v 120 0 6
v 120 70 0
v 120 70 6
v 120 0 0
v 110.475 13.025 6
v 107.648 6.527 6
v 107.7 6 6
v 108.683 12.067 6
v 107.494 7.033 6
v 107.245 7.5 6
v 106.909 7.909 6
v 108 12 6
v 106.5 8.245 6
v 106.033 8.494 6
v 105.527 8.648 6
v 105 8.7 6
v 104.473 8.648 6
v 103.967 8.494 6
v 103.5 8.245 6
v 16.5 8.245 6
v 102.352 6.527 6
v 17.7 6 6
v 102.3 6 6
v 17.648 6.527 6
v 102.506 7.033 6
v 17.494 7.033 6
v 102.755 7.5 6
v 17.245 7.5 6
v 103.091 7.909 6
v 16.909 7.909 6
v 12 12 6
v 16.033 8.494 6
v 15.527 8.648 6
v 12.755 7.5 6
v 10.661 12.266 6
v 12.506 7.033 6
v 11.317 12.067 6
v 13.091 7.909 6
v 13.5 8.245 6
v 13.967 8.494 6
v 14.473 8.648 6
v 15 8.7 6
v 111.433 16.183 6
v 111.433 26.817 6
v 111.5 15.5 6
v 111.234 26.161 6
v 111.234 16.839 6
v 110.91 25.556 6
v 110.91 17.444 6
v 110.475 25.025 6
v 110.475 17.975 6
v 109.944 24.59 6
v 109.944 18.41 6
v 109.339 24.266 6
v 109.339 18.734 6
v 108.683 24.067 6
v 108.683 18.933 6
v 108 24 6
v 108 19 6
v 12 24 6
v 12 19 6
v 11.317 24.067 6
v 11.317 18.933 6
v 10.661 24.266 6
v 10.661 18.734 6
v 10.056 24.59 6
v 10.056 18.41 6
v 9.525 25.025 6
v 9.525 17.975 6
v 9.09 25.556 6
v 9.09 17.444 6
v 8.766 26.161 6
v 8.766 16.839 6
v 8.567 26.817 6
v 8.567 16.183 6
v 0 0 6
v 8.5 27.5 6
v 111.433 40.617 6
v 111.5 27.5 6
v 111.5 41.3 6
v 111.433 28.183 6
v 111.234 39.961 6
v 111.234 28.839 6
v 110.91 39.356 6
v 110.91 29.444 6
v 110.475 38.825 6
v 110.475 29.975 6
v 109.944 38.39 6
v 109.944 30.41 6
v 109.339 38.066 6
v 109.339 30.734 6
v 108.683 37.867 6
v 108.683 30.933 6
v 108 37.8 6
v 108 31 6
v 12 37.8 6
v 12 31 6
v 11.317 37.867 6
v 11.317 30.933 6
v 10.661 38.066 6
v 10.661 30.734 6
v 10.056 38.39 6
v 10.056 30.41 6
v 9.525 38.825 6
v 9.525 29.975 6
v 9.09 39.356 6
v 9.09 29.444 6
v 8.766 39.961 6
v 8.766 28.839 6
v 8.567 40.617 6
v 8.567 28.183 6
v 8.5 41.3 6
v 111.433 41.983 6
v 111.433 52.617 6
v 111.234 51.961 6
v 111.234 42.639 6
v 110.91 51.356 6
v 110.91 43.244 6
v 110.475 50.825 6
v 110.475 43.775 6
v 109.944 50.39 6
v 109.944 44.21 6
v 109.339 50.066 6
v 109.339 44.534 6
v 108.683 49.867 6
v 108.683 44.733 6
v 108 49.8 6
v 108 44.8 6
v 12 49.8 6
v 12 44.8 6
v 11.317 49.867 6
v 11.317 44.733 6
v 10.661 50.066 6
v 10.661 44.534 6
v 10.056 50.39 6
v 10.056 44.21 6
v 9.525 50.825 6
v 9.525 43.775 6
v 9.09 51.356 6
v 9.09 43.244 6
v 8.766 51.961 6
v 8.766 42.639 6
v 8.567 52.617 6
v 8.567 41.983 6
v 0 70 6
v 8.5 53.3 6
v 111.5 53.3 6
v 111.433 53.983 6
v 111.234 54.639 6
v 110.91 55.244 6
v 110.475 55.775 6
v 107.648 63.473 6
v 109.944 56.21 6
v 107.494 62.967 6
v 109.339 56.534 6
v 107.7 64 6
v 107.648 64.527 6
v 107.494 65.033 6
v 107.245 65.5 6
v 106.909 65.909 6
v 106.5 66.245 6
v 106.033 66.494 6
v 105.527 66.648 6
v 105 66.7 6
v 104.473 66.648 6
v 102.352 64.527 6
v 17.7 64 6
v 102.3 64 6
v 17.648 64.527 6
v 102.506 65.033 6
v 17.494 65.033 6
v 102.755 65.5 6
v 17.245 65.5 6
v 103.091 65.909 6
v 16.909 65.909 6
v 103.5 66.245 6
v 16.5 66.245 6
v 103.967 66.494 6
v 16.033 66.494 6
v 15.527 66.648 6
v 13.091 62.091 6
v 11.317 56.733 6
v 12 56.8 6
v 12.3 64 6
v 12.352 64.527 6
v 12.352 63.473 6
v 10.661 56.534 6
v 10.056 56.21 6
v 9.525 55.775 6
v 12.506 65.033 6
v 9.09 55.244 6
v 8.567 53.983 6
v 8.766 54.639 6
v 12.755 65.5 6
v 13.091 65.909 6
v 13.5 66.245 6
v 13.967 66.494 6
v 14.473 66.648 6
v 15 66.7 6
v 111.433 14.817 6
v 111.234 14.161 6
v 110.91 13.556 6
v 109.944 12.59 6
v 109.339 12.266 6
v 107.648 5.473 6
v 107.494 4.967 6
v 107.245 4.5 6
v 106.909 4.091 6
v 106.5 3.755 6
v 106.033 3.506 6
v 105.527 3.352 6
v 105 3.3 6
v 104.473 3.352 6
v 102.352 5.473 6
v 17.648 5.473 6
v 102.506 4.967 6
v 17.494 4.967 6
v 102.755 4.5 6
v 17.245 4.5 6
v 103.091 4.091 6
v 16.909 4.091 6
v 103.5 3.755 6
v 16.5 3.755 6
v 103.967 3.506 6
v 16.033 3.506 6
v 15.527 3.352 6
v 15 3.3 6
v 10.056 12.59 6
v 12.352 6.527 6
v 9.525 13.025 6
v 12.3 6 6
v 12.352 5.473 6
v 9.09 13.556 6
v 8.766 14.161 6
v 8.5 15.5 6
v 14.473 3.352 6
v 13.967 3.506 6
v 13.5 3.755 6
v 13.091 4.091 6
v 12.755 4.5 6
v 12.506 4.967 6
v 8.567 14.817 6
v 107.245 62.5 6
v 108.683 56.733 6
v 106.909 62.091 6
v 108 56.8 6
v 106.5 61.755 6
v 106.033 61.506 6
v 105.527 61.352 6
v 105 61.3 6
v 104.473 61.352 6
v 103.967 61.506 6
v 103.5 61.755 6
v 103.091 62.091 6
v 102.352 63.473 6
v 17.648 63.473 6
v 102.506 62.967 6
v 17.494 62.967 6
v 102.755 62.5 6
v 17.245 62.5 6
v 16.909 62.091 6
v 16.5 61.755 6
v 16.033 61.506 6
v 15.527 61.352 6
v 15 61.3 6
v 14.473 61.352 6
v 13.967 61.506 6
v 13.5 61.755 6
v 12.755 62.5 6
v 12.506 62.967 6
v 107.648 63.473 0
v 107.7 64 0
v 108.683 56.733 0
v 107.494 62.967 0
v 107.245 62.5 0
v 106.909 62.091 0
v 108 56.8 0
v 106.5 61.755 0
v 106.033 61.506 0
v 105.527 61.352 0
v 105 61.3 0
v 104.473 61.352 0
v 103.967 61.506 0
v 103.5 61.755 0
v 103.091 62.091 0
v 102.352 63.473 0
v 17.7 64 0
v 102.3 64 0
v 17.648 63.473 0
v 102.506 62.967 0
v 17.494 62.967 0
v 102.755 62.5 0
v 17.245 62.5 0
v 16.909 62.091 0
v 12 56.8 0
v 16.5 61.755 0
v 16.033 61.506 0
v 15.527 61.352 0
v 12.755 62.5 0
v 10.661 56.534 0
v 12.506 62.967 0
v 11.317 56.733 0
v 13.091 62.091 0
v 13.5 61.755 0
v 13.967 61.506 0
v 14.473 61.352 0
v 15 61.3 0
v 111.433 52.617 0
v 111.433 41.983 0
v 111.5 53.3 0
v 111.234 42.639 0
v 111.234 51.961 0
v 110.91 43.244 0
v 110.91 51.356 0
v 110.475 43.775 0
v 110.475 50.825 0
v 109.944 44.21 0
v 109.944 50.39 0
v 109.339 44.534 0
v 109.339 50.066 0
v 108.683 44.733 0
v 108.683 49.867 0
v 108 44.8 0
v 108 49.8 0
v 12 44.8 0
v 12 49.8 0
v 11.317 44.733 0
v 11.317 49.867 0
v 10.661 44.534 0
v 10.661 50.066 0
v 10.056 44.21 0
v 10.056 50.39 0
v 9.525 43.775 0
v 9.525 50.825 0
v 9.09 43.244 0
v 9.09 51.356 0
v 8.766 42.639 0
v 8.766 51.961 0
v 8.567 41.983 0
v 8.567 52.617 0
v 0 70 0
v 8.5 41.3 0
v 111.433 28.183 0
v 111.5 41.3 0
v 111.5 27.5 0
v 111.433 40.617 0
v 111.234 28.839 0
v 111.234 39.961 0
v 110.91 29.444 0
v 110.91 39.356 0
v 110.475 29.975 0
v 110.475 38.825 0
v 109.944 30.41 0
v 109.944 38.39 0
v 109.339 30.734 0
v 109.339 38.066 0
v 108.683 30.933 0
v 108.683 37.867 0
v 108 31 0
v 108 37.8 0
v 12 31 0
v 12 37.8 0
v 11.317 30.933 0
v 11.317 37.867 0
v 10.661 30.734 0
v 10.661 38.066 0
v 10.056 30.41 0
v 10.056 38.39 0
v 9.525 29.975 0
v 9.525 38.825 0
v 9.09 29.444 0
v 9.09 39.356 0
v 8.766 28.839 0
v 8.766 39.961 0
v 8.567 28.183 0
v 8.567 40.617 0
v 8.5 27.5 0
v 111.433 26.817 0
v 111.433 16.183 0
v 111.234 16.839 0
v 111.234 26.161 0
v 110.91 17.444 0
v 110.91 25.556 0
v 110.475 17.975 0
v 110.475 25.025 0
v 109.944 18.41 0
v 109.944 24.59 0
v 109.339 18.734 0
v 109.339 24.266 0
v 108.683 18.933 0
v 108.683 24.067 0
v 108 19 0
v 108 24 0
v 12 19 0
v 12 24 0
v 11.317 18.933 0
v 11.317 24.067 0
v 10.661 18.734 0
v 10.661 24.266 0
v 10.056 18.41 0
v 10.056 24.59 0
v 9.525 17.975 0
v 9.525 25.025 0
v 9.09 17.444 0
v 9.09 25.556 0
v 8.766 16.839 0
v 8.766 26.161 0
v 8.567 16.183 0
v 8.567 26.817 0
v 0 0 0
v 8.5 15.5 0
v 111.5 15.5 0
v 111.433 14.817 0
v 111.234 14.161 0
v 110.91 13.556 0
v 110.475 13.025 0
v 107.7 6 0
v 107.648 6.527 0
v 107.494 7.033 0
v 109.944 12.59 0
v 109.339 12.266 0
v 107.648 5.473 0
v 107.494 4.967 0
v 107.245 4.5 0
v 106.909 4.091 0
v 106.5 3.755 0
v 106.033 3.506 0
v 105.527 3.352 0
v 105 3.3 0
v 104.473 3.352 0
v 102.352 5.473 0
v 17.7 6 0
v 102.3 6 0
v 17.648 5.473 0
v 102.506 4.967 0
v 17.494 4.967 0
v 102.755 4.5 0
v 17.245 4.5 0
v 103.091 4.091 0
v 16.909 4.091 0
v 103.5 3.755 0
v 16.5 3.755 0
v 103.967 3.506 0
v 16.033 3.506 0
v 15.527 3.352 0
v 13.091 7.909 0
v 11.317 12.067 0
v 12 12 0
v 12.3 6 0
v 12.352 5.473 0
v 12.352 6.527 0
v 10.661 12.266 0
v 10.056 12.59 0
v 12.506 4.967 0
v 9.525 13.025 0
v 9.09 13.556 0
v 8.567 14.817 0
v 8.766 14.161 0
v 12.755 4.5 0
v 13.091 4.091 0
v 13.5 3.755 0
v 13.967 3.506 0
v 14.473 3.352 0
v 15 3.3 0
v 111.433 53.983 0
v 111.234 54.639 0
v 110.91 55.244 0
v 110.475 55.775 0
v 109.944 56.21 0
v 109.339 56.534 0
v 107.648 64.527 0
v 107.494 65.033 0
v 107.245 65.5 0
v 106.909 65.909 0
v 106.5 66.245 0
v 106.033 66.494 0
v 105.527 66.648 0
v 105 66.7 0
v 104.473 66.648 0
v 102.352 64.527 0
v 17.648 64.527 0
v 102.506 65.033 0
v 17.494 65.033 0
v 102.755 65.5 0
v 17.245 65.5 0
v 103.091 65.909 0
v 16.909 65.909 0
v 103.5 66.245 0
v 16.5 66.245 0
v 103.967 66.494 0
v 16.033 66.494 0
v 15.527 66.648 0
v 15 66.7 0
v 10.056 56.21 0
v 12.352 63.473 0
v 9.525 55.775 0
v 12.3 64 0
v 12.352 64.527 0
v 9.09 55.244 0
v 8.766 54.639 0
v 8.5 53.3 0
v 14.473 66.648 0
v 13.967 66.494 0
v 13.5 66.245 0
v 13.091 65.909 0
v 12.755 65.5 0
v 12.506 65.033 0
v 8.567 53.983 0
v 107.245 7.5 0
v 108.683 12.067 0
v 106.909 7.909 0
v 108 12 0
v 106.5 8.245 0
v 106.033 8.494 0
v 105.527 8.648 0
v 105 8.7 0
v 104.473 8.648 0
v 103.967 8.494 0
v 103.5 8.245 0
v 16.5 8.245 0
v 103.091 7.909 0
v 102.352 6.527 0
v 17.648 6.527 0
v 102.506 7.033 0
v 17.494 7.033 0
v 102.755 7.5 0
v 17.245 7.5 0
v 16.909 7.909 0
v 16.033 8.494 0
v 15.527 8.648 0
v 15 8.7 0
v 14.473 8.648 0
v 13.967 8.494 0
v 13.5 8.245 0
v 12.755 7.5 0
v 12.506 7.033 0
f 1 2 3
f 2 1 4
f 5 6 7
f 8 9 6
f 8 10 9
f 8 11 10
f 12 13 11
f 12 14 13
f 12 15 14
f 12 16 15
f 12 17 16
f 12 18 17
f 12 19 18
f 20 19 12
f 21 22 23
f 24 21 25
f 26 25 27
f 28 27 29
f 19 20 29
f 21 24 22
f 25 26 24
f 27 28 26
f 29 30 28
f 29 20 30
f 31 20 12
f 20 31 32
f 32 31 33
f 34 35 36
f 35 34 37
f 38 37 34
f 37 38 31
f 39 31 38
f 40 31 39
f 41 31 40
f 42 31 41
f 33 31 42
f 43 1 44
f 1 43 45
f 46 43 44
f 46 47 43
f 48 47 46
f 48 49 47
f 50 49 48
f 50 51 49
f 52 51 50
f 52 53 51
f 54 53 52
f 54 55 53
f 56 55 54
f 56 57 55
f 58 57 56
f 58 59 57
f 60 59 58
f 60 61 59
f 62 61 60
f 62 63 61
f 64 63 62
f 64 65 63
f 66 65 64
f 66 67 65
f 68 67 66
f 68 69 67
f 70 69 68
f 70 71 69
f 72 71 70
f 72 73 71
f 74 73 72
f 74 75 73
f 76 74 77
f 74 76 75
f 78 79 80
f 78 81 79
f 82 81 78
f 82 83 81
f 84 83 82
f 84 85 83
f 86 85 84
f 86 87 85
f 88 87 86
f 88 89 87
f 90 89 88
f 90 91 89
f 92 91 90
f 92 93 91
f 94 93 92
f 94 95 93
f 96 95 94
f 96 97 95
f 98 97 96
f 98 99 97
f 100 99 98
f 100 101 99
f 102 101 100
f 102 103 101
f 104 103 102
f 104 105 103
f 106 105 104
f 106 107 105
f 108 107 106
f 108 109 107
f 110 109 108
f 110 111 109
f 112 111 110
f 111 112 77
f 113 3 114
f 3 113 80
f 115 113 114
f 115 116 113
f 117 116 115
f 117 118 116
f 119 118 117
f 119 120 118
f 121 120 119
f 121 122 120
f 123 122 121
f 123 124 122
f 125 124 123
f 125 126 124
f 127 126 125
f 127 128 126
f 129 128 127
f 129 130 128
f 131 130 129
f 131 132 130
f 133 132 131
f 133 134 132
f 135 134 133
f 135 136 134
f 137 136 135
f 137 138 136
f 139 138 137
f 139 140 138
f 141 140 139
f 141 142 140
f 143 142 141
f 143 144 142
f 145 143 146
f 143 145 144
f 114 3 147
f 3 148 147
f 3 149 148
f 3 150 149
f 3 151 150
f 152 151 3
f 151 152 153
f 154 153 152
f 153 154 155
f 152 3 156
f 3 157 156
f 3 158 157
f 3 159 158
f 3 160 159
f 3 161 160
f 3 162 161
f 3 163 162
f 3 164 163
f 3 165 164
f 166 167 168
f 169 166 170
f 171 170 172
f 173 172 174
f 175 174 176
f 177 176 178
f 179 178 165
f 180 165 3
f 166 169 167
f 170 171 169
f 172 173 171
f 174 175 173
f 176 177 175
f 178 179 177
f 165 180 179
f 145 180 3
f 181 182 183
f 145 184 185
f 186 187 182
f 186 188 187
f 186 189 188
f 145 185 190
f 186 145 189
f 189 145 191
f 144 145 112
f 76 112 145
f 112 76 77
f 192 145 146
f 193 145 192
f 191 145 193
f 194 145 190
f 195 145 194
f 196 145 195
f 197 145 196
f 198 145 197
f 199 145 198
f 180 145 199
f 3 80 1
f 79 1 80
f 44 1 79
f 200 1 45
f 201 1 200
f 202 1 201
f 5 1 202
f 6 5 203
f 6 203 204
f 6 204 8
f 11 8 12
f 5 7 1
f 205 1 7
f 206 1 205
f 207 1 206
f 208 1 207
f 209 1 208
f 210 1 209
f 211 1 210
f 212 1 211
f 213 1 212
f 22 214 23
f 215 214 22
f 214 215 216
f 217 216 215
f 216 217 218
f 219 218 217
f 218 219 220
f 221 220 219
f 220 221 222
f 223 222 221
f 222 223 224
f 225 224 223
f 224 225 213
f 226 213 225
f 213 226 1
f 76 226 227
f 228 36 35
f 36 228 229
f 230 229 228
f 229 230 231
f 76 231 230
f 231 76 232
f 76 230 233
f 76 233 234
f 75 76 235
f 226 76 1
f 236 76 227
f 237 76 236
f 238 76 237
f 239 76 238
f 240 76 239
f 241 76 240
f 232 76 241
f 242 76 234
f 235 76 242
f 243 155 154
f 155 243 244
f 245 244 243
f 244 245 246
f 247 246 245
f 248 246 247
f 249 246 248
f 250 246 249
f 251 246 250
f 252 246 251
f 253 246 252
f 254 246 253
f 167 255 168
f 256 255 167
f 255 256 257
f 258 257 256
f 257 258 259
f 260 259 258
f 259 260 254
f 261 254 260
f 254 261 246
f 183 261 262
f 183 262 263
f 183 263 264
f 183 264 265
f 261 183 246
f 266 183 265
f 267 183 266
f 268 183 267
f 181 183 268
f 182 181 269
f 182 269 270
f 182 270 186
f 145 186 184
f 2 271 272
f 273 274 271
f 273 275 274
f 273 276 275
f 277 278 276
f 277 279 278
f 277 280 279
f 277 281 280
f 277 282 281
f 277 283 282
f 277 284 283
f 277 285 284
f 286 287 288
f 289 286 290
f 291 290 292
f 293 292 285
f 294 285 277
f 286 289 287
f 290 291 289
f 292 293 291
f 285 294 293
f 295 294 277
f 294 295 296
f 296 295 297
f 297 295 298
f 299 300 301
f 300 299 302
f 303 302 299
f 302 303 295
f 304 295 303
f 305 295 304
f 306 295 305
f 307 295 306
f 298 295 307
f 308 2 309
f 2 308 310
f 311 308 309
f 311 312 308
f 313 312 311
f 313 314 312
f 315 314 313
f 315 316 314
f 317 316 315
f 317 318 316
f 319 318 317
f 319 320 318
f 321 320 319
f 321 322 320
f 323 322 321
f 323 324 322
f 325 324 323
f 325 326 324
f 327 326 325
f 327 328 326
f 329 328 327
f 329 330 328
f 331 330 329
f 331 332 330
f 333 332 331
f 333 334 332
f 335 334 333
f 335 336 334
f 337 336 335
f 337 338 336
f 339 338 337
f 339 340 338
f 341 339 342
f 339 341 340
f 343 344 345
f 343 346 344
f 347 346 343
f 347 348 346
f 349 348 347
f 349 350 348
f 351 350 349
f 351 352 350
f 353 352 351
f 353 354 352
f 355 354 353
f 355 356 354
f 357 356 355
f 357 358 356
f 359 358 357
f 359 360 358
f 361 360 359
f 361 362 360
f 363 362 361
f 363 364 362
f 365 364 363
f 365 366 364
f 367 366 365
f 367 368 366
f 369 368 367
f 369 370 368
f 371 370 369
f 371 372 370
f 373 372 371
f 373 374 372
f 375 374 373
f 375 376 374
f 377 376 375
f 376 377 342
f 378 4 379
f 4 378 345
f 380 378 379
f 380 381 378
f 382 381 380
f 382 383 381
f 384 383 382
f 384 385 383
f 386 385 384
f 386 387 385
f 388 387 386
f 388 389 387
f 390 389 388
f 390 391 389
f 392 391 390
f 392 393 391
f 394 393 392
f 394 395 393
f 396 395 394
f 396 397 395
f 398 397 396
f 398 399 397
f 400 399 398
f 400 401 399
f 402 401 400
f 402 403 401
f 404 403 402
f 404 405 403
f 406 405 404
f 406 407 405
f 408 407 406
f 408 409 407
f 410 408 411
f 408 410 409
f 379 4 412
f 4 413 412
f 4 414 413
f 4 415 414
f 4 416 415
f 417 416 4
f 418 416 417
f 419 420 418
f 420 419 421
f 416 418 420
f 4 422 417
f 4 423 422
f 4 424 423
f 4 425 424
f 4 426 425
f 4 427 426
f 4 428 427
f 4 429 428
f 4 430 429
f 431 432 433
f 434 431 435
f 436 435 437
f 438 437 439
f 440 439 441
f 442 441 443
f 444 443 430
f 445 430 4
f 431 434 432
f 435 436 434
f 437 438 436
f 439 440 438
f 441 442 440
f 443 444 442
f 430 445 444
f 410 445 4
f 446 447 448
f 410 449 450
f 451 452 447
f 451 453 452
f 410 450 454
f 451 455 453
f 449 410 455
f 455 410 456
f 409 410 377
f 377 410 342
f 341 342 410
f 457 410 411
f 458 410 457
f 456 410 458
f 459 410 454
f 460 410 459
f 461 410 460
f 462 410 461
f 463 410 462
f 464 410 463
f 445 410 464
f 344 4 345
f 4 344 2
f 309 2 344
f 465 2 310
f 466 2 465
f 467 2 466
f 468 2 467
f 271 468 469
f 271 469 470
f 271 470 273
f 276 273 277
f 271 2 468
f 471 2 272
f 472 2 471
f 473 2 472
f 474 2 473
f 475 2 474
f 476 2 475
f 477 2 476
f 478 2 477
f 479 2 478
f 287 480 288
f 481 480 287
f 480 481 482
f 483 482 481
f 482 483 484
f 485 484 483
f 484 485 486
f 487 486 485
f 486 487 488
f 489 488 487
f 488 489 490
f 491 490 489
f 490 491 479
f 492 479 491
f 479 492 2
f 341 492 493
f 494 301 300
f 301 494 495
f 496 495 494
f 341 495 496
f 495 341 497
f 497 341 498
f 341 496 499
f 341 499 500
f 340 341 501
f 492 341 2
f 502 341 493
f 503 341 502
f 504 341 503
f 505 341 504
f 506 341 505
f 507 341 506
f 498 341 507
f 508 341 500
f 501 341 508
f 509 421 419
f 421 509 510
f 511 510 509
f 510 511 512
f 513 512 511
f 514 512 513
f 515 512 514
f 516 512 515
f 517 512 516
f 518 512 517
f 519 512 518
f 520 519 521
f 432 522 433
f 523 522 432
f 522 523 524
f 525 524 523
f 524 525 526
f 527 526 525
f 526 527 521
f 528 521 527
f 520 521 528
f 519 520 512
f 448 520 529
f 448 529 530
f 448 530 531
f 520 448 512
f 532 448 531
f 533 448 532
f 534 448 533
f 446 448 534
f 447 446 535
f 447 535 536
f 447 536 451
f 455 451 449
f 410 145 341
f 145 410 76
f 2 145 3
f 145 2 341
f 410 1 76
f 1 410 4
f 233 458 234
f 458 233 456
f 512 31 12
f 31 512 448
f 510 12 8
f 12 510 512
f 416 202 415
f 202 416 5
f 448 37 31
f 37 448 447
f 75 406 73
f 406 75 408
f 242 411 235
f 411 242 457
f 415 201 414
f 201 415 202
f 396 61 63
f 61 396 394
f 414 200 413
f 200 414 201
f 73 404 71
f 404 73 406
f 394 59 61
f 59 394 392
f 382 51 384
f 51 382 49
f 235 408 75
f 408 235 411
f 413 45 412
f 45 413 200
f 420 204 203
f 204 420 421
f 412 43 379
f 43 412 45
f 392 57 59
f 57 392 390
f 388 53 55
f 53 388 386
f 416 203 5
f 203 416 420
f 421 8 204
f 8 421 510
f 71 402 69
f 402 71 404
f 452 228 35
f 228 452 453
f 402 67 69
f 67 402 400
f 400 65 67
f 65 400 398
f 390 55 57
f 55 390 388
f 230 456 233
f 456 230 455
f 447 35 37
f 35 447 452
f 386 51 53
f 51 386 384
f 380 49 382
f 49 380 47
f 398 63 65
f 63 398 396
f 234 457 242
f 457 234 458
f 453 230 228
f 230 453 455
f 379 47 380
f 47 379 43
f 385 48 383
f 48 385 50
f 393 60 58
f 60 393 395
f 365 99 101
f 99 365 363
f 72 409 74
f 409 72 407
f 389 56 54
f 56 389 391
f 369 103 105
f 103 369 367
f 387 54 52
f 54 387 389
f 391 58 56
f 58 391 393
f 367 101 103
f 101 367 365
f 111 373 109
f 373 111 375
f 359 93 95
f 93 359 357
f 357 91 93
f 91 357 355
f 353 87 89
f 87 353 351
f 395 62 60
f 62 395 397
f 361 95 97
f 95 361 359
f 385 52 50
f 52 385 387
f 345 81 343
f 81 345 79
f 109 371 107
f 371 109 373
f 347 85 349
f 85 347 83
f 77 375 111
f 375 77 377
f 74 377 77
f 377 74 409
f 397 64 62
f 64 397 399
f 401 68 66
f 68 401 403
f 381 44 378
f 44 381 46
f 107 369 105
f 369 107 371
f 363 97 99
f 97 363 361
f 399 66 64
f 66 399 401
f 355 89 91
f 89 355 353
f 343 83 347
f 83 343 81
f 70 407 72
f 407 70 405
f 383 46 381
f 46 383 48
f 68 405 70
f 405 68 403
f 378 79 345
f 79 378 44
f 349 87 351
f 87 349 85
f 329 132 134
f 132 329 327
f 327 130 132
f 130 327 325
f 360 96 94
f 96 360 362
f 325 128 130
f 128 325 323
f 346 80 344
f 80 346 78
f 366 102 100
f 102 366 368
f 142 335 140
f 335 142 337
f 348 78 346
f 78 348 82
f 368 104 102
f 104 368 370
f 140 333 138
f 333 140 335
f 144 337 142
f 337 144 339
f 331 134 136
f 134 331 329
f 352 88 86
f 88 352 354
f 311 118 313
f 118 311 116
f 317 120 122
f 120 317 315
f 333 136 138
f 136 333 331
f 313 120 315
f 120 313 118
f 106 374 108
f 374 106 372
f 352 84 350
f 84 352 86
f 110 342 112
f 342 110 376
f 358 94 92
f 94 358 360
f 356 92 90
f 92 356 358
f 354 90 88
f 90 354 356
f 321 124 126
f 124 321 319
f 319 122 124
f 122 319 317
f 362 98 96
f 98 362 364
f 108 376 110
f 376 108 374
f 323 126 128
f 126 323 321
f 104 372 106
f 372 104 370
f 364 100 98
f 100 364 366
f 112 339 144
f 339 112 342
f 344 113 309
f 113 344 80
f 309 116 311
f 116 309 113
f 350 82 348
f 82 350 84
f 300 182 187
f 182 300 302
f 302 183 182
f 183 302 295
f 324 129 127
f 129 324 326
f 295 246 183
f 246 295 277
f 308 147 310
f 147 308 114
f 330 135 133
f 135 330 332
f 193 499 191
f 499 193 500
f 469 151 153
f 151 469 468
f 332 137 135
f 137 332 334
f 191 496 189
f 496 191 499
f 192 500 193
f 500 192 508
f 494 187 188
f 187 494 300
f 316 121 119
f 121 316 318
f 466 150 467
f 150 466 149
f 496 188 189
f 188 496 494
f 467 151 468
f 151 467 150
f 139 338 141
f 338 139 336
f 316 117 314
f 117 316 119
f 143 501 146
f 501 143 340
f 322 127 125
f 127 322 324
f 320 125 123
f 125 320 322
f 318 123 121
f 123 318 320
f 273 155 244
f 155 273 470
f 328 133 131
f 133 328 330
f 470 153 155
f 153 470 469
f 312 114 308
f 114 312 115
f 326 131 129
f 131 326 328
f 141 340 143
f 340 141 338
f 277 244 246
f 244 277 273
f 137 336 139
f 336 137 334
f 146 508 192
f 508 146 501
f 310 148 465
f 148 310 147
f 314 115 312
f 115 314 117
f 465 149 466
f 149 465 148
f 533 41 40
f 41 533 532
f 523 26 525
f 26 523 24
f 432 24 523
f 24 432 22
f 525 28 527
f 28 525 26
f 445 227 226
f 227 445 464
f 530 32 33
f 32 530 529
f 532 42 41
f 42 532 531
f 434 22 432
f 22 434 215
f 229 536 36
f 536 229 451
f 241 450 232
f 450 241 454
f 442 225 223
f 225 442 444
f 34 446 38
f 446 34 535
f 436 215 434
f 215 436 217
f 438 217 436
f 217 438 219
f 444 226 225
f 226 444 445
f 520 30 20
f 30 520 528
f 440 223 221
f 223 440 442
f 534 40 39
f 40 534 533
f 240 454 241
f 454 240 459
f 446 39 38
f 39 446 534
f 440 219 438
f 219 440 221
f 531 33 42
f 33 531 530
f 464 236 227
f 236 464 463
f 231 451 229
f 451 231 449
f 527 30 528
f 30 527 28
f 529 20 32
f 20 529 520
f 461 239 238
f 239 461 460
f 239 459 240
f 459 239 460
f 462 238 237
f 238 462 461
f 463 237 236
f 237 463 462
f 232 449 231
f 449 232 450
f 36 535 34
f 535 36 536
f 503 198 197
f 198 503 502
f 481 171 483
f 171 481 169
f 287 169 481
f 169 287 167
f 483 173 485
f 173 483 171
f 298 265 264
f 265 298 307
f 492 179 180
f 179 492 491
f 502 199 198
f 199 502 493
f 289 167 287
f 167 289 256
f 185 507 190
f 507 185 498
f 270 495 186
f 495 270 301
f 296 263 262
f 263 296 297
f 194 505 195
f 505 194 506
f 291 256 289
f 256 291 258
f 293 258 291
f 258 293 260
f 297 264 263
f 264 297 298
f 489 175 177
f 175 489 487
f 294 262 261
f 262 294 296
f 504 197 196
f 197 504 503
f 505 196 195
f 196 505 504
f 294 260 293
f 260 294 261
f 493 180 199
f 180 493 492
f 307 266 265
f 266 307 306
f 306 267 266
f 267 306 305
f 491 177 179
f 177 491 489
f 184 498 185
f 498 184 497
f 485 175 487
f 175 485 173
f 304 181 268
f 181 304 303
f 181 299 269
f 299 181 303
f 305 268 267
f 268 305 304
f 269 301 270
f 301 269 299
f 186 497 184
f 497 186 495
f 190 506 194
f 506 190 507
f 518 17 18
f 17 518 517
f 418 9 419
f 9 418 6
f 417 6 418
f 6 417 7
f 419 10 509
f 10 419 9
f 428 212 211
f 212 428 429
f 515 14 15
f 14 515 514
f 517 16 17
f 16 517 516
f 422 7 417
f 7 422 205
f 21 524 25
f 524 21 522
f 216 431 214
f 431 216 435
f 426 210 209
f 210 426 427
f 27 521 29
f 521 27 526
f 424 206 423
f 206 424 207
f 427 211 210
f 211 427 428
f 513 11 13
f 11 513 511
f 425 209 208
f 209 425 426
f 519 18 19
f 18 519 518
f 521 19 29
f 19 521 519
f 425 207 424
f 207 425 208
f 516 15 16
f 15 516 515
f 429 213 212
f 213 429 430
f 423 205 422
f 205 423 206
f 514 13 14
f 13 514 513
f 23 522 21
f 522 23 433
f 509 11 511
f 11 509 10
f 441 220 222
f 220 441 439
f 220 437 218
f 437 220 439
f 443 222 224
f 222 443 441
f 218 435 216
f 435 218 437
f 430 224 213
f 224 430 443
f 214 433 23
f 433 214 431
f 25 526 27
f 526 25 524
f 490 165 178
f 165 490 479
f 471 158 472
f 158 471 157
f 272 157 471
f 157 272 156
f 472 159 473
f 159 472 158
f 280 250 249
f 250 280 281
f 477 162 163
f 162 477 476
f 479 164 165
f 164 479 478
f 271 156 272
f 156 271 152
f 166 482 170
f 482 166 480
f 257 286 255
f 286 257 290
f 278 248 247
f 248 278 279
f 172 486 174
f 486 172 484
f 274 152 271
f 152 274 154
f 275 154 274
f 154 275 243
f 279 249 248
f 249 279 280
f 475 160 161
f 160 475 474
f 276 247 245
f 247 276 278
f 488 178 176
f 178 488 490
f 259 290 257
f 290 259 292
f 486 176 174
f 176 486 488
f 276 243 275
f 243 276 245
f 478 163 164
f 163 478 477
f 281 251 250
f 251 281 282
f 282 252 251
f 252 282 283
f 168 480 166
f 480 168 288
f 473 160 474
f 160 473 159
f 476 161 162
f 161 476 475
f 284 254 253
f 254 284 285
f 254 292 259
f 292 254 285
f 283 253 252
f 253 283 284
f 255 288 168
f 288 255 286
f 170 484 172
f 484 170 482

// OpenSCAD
$fn = 32;

// ----------------------------------------------------------------------
// Slotted panel: 120 x 70 mm, 4 ряда of slots
// ----------------------------------------------------------------------

// --- parameters (mm) ---
panel_w = 120;            // panel width
panel_d = 70;             // panel depth
thick = 6;                // panel thickness
slot_w = 7;               // slot width
pitch0 = 12;              // first row pitch
pitch_step = 1.8;         // pitch increase per row
margin = 12;              // margin around the slot field
rows = 4;                 // number of slot rows
mount_d = 5.4;            // mounting holes
mount_x = 45;             // mounting hole offset

difference() {
  union() {
    cube([panel_w, panel_d, thick]);
  }
  /* slot rows: stadium shaped cutters, 2.5 mm clear of both faces */
  /* row 0: pitch 12, length 96 */
  hull() {
    translate([12, 15.5, -2.5]) cylinder(h = thick + 5, d = slot_w);
    translate([108, 15.5, -2.5]) cylinder(h = thick + 5, d = slot_w);
  }
  /* row 1: pitch 13.8, length 96 */
  hull() {
    translate([12, 27.5, -2.5]) cylinder(h = thick + 5, d = slot_w);
    translate([108, 27.5, -2.5]) cylinder(h = thick + 5, d = slot_w);
  }
  /* row 2: pitch 12, length 96 */
  hull() {
    translate([12, 41.3, -2.5]) cylinder(h = thick + 5, d = slot_w);
    translate([108, 41.3, -2.5]) cylinder(h = thick + 5, d = slot_w);
  }
  /* row 3: pitch 13.8, length 96 */
  hull() {
    translate([12, 53.3, -2.5]) cylinder(h = thick + 5, d = slot_w);
    translate([108, 53.3, -2.5]) cylinder(h = thick + 5, d = slot_w);
  }
  translate([15, 6, -2.5]) cylinder(h = 11, d = mount_d);
  translate([15, 64, -2.5]) cylinder(h = 11, d = mount_d);
  translate([105, 6, -2.5]) cylinder(h = 11, d = mount_d);
  translate([105, 64, -2.5]) cylinder(h = 11, d = mount_d);
}
